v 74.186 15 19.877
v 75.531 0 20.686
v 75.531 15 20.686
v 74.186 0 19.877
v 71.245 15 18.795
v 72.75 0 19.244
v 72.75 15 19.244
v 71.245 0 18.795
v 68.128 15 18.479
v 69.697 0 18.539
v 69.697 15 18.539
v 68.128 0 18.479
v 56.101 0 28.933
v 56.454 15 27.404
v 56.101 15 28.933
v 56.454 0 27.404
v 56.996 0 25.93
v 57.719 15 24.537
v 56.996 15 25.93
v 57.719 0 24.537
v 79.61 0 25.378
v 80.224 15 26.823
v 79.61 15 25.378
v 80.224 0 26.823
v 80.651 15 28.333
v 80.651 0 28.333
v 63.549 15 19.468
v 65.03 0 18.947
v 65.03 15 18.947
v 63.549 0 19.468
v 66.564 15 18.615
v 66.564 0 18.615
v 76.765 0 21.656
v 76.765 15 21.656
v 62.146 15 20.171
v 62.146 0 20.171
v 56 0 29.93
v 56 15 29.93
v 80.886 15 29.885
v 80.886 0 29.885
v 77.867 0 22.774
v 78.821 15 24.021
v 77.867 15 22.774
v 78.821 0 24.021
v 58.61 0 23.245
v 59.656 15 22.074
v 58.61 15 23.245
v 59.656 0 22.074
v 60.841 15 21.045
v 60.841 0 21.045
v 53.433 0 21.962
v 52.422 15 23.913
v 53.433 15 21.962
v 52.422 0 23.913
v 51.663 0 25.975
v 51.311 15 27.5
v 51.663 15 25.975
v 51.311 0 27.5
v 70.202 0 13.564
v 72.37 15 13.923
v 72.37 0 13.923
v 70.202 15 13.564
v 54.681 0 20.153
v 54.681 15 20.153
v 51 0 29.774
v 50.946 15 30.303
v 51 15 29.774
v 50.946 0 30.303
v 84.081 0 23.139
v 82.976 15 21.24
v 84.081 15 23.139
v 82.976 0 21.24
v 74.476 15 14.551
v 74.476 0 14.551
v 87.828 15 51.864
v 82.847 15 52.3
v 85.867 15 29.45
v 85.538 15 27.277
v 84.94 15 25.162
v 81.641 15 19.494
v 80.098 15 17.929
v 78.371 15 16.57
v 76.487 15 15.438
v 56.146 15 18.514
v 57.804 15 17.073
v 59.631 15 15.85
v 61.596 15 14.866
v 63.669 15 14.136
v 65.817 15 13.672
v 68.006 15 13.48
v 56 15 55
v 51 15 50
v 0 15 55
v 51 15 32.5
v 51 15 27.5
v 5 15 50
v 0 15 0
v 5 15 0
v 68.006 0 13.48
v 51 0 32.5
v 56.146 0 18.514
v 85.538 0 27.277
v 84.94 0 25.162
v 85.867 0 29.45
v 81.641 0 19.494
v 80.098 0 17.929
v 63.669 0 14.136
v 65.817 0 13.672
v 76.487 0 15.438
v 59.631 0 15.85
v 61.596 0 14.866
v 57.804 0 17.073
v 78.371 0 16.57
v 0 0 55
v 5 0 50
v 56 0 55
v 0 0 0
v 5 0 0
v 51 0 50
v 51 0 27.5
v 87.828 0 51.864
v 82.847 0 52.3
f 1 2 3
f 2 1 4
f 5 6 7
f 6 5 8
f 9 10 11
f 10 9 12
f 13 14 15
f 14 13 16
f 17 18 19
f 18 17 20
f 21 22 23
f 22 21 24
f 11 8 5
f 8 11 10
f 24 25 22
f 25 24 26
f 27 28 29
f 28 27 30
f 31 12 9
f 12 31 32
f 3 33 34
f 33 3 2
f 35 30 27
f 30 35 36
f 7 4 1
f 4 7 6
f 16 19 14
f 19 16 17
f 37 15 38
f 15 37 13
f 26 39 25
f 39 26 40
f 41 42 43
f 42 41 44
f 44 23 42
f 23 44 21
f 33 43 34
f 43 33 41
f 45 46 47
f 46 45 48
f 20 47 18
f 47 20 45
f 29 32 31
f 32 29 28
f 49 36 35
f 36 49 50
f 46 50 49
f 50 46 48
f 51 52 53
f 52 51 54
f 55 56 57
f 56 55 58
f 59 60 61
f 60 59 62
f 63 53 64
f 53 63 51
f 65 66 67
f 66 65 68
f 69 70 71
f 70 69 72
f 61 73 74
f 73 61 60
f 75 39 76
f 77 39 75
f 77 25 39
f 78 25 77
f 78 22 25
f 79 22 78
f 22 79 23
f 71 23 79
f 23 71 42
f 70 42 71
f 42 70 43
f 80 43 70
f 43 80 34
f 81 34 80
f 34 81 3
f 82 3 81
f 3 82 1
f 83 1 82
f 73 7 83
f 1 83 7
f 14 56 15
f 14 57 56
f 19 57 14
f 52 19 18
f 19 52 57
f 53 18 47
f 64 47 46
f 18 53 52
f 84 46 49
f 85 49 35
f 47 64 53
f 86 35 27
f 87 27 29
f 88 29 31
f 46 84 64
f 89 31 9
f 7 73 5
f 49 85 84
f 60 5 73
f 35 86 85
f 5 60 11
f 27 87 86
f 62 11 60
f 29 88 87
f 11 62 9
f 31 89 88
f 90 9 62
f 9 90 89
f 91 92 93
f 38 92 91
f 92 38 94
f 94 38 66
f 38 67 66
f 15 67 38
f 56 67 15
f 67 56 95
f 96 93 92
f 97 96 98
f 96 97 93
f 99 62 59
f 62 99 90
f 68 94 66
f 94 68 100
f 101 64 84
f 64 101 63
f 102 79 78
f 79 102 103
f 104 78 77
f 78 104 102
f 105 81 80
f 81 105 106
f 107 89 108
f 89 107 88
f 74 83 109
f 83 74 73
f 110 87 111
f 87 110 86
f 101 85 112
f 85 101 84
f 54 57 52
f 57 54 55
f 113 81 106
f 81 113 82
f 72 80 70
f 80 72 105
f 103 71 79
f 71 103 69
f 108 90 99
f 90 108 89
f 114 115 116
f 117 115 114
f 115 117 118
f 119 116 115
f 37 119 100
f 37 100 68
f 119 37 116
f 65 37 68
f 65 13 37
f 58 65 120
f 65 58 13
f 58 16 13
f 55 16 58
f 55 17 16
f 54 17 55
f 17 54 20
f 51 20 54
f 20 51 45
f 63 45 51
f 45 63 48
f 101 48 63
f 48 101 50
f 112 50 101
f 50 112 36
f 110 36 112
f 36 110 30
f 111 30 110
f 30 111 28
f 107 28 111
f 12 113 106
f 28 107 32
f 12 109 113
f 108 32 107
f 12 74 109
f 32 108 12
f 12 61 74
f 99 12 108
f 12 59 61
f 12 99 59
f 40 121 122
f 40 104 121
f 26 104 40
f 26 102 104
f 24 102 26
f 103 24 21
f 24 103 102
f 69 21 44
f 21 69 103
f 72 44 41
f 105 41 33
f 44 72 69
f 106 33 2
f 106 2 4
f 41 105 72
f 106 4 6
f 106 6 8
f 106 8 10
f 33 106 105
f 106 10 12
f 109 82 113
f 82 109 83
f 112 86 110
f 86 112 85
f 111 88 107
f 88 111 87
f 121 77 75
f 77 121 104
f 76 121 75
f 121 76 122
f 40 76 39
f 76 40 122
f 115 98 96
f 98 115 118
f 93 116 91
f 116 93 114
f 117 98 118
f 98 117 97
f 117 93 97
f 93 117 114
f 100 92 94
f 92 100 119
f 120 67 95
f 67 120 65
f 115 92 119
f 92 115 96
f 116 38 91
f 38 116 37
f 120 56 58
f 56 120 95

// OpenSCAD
$fn=50;
BackLength=55;//Back Depth
HBWidth=46;//Frame Width
HoseDiameter=25;//Hanger Diameter
FrontLength=35;//Front Height
Width=15;//Hanger Width
HangerThickenss=5;//Thickness


translate([0,0,0])cube([HangerThickenss,Width,BackLength]);
translate([HangerThickenss,0,BackLength-HangerThickenss])cube([HBWidth,Width,HangerThickenss]);
translate([HBWidth+HangerThickenss,0,BackLength-FrontLength+HoseDiameter/2-HangerThickenss])cube([HangerThickenss,Width,FrontLength-HoseDiameter/2+HangerThickenss]);
translate([HBWidth+HangerThickenss,0,BackLength-FrontLength+HoseDiameter/2])rotate([0,5,0])hanger();

module hanger(){
    difference(){
        translate([HoseDiameter/2+HangerThickenss,Width/2,0])rotate([90,0,0])cylinder(d=HoseDiameter+HangerThickenss*2,h=Width,center=true);
        union(){
            translate([HoseDiameter/2+HangerThickenss,Width/2,0])rotate([90,0,0])cylinder(d=HoseDiameter,h=Width+2,center=true);
            translate([0,-1,0])cube([HoseDiameter+HangerThickenss*2,Width+2,HoseDiameter]);
        }
    }
    translate([HoseDiameter+HangerThickenss,0,0])cube([HangerThickenss,Width,FrontLength-HoseDiameter/2]);
}
